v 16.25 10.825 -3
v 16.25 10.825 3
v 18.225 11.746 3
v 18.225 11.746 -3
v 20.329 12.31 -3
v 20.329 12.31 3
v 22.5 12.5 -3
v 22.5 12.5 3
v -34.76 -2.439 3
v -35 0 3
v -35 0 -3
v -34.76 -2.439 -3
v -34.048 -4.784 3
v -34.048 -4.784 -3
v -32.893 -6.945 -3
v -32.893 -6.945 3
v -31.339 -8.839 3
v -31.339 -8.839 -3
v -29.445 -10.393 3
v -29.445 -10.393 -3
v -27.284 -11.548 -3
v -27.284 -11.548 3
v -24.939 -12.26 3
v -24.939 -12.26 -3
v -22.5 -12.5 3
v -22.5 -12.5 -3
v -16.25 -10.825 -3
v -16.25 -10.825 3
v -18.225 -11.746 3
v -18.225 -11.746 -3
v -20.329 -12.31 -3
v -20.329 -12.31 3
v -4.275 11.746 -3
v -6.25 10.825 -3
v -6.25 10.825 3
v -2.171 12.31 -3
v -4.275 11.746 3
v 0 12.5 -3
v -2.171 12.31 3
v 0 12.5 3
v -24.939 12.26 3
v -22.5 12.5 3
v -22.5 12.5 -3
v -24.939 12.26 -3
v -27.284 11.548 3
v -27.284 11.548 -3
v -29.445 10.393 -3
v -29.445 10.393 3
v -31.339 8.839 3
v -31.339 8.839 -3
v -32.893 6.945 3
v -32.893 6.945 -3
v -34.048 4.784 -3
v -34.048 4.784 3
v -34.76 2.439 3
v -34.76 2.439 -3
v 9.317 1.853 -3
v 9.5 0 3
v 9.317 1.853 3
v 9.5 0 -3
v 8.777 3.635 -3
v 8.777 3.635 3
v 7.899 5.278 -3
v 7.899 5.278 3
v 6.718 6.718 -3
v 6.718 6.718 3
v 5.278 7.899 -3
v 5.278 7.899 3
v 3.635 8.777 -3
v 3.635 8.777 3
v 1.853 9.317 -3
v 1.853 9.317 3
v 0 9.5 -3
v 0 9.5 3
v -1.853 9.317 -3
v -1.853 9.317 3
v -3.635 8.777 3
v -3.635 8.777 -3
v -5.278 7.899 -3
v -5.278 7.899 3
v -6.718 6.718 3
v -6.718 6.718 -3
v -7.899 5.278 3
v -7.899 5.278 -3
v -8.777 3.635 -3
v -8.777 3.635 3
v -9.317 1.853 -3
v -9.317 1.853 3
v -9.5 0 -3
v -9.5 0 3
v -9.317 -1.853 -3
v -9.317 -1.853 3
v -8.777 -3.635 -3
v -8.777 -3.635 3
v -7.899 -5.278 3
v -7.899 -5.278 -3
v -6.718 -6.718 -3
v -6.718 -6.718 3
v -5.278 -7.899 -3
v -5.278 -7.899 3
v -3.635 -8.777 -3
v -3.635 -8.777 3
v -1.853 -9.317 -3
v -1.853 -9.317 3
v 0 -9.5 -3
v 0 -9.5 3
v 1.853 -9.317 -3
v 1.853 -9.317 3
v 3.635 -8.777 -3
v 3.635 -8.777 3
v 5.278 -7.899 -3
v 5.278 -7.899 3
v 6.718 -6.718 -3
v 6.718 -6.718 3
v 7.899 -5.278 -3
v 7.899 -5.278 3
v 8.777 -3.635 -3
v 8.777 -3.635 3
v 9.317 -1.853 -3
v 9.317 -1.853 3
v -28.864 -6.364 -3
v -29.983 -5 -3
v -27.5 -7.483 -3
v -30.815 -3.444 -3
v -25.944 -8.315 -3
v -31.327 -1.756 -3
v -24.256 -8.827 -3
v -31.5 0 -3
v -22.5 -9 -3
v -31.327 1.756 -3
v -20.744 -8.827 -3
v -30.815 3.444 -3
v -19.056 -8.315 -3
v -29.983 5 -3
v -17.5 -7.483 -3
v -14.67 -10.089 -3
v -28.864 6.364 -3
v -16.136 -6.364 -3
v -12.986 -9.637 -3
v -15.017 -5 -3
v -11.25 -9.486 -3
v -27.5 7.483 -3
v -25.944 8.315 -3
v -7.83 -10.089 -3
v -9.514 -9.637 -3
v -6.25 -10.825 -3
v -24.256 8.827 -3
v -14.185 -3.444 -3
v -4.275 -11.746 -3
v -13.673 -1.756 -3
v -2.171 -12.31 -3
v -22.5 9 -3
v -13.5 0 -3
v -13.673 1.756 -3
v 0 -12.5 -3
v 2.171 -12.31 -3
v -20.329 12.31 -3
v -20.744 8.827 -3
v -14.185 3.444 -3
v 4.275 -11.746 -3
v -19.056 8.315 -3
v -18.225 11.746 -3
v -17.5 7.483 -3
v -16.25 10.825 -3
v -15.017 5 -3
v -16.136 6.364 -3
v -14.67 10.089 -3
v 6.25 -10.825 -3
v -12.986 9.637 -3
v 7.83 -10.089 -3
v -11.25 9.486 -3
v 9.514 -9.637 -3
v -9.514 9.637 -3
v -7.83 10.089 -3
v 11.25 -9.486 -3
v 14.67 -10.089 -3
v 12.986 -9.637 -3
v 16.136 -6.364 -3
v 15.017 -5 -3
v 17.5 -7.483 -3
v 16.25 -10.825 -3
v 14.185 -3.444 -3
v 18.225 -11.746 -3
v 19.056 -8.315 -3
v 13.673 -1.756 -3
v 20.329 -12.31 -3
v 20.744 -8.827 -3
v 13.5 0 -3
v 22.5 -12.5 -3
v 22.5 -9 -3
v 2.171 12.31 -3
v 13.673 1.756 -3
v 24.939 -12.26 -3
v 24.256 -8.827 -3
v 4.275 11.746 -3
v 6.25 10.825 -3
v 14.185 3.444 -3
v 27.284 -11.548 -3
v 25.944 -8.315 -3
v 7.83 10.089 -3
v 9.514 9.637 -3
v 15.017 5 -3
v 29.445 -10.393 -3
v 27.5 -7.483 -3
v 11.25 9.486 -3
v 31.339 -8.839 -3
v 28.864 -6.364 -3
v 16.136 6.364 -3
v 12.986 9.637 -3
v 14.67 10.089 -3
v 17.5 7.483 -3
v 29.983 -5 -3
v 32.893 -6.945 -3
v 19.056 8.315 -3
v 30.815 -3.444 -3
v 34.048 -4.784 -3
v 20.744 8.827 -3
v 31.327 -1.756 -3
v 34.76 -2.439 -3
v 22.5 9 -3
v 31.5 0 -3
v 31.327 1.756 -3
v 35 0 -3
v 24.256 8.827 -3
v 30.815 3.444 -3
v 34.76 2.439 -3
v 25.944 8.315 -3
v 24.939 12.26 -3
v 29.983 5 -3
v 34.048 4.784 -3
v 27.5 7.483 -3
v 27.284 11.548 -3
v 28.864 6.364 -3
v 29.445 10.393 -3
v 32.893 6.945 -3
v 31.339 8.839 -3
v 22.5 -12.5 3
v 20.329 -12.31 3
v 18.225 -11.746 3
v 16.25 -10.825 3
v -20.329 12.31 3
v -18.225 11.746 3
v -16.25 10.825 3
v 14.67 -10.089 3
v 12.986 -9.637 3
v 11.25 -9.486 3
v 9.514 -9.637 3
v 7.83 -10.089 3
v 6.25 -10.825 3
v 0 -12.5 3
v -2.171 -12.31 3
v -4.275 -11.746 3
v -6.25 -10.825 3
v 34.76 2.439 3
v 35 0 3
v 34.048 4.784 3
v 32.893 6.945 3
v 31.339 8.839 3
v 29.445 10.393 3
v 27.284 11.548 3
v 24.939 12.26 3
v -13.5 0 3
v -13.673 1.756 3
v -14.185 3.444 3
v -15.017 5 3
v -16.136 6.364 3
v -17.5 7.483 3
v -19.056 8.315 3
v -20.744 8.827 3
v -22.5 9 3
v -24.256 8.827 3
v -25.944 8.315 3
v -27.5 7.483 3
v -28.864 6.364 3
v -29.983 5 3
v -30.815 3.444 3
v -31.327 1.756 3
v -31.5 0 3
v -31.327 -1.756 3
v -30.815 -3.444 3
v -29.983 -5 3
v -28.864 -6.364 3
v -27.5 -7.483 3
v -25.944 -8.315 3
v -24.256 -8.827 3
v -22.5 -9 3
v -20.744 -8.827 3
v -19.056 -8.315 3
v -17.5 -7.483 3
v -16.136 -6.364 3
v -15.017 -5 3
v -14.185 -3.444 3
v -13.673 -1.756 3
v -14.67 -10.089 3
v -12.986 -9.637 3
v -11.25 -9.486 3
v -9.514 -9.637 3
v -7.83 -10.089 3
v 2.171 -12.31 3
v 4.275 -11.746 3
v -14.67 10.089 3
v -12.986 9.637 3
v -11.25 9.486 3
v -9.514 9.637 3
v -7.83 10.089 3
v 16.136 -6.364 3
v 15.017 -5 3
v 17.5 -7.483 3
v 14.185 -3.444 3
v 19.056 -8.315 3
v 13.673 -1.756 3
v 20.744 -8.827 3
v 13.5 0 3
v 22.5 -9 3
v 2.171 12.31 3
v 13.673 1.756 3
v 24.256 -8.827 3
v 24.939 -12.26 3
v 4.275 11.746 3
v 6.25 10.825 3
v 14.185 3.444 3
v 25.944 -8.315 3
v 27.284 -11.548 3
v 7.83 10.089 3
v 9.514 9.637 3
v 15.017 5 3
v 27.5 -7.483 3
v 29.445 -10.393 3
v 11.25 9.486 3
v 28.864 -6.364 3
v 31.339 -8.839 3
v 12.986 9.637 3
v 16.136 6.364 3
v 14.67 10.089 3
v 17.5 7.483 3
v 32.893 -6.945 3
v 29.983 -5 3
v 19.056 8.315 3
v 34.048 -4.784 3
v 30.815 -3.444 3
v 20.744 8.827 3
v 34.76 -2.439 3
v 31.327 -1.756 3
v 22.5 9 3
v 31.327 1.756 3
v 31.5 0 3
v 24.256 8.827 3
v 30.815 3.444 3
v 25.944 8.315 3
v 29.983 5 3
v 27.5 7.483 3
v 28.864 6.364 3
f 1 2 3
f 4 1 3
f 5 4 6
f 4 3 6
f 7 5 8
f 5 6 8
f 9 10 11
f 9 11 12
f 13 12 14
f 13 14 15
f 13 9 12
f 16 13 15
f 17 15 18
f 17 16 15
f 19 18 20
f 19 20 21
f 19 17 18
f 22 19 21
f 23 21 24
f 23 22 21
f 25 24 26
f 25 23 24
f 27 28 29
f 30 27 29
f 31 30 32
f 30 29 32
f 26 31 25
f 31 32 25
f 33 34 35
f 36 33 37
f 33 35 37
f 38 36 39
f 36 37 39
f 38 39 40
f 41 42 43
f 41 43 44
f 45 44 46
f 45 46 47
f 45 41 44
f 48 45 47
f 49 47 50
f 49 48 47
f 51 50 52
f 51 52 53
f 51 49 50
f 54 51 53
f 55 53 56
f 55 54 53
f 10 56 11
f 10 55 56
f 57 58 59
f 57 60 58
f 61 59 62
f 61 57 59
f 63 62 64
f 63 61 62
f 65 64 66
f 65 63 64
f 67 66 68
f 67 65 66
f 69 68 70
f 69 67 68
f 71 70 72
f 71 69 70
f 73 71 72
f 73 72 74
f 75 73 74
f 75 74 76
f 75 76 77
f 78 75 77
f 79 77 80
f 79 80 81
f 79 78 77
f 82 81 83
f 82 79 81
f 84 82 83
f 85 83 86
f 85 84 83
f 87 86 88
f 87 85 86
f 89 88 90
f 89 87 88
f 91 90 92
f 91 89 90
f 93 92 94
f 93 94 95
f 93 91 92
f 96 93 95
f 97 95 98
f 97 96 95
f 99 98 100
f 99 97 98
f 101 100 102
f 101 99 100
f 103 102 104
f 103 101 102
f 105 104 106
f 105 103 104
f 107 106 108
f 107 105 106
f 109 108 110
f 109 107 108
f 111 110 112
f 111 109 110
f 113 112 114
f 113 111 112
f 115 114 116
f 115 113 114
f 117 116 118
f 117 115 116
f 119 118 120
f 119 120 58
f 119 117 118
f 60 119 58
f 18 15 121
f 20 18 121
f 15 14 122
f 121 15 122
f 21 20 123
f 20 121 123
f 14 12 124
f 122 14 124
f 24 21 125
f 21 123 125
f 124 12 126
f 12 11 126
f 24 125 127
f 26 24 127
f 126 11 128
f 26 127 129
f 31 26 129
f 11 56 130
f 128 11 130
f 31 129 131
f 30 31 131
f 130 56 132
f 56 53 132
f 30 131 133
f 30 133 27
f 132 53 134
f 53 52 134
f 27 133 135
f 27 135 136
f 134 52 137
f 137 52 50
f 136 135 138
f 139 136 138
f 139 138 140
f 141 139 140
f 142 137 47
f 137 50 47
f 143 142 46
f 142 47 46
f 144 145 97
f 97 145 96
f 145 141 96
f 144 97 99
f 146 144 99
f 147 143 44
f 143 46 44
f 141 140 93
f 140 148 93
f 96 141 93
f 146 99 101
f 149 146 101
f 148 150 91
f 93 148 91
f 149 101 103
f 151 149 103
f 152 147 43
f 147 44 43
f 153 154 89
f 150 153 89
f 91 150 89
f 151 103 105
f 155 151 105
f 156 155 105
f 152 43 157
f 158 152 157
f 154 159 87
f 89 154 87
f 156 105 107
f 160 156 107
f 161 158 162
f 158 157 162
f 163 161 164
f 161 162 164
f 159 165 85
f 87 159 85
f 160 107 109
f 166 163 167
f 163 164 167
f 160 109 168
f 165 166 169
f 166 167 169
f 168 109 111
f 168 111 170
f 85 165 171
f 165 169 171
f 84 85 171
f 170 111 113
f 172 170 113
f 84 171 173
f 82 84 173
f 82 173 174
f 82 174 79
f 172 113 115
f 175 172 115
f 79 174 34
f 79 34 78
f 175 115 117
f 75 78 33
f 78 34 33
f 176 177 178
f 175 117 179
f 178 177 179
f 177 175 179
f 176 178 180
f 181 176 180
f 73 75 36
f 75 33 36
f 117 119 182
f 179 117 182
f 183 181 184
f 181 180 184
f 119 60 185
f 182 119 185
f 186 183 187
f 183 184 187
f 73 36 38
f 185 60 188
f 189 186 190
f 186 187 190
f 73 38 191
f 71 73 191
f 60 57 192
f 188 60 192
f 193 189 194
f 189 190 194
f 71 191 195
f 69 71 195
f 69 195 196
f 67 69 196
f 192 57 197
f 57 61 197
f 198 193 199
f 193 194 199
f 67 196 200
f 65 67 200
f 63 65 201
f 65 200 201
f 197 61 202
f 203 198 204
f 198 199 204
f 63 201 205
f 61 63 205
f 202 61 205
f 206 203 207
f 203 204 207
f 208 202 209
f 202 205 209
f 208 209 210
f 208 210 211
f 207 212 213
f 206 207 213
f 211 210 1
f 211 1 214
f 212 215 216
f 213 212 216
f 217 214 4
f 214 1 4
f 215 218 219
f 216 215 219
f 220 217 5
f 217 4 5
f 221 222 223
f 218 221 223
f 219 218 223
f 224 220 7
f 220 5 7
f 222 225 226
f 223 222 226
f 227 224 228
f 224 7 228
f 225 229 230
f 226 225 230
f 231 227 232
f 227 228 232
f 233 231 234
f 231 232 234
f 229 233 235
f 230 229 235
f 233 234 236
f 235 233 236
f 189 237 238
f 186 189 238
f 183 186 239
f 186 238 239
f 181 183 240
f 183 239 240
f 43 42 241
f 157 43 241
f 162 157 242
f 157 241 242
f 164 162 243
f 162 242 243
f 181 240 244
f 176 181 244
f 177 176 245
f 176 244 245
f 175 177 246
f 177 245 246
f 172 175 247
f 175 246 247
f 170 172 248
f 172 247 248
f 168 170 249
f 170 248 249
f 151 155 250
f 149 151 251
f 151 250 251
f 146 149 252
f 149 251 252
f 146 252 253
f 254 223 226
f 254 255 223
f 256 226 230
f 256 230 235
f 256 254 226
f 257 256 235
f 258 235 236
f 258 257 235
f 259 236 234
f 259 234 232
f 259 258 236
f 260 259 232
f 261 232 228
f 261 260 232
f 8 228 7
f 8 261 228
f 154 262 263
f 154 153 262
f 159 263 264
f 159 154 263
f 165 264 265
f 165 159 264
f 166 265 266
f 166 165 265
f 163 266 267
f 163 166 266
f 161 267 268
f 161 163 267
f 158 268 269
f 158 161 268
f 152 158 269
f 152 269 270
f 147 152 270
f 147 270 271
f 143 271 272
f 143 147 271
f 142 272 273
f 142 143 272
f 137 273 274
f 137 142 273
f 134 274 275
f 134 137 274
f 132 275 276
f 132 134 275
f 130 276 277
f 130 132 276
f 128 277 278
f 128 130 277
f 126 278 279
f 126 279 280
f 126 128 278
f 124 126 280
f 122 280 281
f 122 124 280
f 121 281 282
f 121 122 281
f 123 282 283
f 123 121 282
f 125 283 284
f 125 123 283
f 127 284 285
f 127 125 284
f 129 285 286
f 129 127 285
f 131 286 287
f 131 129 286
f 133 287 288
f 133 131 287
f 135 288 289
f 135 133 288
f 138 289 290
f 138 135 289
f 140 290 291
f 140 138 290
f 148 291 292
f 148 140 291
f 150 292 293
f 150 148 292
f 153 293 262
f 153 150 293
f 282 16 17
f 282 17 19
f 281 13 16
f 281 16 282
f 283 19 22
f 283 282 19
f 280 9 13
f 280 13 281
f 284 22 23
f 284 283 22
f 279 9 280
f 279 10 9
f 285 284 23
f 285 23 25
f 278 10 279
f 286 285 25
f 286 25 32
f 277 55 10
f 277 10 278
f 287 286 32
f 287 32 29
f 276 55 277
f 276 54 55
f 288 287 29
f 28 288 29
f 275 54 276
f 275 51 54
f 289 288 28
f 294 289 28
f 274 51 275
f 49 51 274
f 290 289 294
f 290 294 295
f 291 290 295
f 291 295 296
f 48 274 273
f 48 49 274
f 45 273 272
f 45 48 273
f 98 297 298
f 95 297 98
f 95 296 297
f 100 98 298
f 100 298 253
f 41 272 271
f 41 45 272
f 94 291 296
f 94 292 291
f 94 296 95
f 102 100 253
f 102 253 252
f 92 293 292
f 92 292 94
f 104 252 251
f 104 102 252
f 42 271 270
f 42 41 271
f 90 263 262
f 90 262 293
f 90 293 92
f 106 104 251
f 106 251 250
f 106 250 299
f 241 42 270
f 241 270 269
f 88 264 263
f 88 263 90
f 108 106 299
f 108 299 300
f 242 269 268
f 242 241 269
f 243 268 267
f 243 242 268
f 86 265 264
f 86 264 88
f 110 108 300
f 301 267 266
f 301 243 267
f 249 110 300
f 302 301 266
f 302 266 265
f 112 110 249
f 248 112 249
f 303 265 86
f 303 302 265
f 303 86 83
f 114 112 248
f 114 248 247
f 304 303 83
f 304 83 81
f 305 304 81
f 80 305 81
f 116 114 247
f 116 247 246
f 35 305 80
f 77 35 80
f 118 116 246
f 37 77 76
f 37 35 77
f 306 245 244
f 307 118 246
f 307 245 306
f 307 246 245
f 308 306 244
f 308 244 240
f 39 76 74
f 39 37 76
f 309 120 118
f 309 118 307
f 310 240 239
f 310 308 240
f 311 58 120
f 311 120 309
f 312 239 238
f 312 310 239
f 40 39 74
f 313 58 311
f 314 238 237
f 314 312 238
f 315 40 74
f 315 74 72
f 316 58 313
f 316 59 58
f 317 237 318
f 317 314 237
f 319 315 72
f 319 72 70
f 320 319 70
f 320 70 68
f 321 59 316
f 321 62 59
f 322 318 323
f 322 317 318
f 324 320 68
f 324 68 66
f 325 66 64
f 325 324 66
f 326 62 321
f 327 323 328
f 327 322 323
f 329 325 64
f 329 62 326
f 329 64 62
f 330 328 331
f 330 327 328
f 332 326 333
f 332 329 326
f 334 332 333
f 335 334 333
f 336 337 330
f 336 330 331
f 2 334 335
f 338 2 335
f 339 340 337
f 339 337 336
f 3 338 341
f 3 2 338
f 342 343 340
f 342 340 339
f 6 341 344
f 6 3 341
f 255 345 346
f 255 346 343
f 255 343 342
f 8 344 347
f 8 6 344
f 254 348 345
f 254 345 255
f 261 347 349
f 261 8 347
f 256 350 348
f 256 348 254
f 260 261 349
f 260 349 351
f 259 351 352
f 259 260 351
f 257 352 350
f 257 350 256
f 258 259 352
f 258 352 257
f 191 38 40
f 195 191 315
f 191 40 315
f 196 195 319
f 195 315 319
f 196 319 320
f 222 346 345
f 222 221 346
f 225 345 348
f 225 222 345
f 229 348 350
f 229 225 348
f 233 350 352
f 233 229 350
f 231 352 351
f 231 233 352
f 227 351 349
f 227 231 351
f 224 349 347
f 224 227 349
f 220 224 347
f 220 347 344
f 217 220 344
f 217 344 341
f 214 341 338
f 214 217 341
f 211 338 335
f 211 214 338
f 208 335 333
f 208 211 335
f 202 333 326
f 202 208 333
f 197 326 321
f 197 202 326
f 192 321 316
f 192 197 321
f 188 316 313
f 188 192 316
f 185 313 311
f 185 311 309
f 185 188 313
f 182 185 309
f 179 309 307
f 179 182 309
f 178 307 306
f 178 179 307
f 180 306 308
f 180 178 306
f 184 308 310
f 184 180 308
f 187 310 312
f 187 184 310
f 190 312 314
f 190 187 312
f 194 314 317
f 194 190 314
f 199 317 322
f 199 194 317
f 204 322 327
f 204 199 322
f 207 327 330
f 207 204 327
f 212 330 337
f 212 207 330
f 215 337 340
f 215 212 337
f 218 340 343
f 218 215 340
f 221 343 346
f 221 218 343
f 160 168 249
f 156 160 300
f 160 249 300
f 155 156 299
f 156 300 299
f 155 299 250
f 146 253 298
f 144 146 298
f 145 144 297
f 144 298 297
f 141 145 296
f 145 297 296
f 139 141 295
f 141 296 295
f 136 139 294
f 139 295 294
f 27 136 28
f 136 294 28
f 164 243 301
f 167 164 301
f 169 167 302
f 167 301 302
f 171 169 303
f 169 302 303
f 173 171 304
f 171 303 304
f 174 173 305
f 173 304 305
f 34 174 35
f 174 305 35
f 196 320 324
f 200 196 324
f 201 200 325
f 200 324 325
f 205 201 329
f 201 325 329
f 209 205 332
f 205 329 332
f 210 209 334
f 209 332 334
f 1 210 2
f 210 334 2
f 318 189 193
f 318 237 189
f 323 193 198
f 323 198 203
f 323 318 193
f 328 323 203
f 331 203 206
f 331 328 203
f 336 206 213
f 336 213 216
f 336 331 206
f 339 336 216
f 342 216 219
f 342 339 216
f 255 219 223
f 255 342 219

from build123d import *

# Parameters (mm, degrees)
F0_R     = 9
F0_R_2   = 9.5
F1_DEPTH = 3
F3_DEPTH = 6.001


with BuildPart() as f1:
    # F0 (on Top) → F1 (new body, symmetric)
    with BuildSketch(Plane.XY):
        with BuildLine():
            Line((22.5, 12.5), (-22.5, 12.5))
            ThreePointArc((-22.5, 12.5), (-31.338835, 8.838835), (-35, 0))
            ThreePointArc((-35, 0), (-31.338835, -8.838835), (-22.5, -12.5))
            Line((-22.5, -12.5), (22.5, -12.5))
            ThreePointArc((22.5, -12.5), (31.338835, -8.838835), (35, 0))
            ThreePointArc((35, 0), (31.338835, 8.838835), (22.5, 12.5))
        make_face()
        with Locations((-22.5, 0)):
            Circle(F0_R, mode=Mode.SUBTRACT)
        Circle(F0_R_2, mode=Mode.SUBTRACT)
        with Locations((22.5, 0)):
            Circle(F0_R, mode=Mode.SUBTRACT)
    extrude(amount=F1_DEPTH, both=True)

    # F2 (on face) → F3 (cut, through all)
    with BuildSketch(Plane.XY.offset(3)):
        with BuildLine():
            Line((22.5, 12.5), (0, 12.5))
            ThreePointArc((0, 12.5), (3.235238, 12.074073), (6.25, 10.825318))
            ThreePointArc((6.25, 10.825318), (11.25, 9.485572), (16.25, 10.825318))
            ThreePointArc((16.25, 10.825318), (19.264762, 12.074073), (22.5, 12.5))
        make_face()
        with BuildLine():
            ThreePointArc((-22.5, 12.5), (-19.264762, 12.074073), (-16.25, 10.825318))
            ThreePointArc((-16.25, 10.825318), (-11.25, 9.485572), (-6.25, 10.825318))
            ThreePointArc((-6.25, 10.825318), (-3.235238, 12.074073), (0, 12.5))
            Line((0, 12.5), (-22.5, 12.5))
        make_face()
        with BuildLine():
            ThreePointArc((6.25, -10.825318), (3.235238, -12.074073), (0, -12.5))
            Line((0, -12.5), (22.5, -12.5))
            ThreePointArc((22.5, -12.5), (19.264762, -12.074073), (16.25, -10.825318))
            ThreePointArc((16.25, -10.825318), (11.25, -9.485572), (6.25, -10.825318))
        make_face()
        with BuildLine():
            ThreePointArc((-16.25, -10.825318), (-19.264762, -12.074073), (-22.5, -12.5))
            Line((-22.5, -12.5), (0, -12.5))
            ThreePointArc((0, -12.5), (-3.235238, -12.074073), (-6.25, -10.825318))
            ThreePointArc((-6.25, -10.825318), (-11.25, -9.485572), (-16.25, -10.825318))
        make_face()
    extrude(amount=-F3_DEPTH, mode=Mode.SUBTRACT)


solid = f1.part
